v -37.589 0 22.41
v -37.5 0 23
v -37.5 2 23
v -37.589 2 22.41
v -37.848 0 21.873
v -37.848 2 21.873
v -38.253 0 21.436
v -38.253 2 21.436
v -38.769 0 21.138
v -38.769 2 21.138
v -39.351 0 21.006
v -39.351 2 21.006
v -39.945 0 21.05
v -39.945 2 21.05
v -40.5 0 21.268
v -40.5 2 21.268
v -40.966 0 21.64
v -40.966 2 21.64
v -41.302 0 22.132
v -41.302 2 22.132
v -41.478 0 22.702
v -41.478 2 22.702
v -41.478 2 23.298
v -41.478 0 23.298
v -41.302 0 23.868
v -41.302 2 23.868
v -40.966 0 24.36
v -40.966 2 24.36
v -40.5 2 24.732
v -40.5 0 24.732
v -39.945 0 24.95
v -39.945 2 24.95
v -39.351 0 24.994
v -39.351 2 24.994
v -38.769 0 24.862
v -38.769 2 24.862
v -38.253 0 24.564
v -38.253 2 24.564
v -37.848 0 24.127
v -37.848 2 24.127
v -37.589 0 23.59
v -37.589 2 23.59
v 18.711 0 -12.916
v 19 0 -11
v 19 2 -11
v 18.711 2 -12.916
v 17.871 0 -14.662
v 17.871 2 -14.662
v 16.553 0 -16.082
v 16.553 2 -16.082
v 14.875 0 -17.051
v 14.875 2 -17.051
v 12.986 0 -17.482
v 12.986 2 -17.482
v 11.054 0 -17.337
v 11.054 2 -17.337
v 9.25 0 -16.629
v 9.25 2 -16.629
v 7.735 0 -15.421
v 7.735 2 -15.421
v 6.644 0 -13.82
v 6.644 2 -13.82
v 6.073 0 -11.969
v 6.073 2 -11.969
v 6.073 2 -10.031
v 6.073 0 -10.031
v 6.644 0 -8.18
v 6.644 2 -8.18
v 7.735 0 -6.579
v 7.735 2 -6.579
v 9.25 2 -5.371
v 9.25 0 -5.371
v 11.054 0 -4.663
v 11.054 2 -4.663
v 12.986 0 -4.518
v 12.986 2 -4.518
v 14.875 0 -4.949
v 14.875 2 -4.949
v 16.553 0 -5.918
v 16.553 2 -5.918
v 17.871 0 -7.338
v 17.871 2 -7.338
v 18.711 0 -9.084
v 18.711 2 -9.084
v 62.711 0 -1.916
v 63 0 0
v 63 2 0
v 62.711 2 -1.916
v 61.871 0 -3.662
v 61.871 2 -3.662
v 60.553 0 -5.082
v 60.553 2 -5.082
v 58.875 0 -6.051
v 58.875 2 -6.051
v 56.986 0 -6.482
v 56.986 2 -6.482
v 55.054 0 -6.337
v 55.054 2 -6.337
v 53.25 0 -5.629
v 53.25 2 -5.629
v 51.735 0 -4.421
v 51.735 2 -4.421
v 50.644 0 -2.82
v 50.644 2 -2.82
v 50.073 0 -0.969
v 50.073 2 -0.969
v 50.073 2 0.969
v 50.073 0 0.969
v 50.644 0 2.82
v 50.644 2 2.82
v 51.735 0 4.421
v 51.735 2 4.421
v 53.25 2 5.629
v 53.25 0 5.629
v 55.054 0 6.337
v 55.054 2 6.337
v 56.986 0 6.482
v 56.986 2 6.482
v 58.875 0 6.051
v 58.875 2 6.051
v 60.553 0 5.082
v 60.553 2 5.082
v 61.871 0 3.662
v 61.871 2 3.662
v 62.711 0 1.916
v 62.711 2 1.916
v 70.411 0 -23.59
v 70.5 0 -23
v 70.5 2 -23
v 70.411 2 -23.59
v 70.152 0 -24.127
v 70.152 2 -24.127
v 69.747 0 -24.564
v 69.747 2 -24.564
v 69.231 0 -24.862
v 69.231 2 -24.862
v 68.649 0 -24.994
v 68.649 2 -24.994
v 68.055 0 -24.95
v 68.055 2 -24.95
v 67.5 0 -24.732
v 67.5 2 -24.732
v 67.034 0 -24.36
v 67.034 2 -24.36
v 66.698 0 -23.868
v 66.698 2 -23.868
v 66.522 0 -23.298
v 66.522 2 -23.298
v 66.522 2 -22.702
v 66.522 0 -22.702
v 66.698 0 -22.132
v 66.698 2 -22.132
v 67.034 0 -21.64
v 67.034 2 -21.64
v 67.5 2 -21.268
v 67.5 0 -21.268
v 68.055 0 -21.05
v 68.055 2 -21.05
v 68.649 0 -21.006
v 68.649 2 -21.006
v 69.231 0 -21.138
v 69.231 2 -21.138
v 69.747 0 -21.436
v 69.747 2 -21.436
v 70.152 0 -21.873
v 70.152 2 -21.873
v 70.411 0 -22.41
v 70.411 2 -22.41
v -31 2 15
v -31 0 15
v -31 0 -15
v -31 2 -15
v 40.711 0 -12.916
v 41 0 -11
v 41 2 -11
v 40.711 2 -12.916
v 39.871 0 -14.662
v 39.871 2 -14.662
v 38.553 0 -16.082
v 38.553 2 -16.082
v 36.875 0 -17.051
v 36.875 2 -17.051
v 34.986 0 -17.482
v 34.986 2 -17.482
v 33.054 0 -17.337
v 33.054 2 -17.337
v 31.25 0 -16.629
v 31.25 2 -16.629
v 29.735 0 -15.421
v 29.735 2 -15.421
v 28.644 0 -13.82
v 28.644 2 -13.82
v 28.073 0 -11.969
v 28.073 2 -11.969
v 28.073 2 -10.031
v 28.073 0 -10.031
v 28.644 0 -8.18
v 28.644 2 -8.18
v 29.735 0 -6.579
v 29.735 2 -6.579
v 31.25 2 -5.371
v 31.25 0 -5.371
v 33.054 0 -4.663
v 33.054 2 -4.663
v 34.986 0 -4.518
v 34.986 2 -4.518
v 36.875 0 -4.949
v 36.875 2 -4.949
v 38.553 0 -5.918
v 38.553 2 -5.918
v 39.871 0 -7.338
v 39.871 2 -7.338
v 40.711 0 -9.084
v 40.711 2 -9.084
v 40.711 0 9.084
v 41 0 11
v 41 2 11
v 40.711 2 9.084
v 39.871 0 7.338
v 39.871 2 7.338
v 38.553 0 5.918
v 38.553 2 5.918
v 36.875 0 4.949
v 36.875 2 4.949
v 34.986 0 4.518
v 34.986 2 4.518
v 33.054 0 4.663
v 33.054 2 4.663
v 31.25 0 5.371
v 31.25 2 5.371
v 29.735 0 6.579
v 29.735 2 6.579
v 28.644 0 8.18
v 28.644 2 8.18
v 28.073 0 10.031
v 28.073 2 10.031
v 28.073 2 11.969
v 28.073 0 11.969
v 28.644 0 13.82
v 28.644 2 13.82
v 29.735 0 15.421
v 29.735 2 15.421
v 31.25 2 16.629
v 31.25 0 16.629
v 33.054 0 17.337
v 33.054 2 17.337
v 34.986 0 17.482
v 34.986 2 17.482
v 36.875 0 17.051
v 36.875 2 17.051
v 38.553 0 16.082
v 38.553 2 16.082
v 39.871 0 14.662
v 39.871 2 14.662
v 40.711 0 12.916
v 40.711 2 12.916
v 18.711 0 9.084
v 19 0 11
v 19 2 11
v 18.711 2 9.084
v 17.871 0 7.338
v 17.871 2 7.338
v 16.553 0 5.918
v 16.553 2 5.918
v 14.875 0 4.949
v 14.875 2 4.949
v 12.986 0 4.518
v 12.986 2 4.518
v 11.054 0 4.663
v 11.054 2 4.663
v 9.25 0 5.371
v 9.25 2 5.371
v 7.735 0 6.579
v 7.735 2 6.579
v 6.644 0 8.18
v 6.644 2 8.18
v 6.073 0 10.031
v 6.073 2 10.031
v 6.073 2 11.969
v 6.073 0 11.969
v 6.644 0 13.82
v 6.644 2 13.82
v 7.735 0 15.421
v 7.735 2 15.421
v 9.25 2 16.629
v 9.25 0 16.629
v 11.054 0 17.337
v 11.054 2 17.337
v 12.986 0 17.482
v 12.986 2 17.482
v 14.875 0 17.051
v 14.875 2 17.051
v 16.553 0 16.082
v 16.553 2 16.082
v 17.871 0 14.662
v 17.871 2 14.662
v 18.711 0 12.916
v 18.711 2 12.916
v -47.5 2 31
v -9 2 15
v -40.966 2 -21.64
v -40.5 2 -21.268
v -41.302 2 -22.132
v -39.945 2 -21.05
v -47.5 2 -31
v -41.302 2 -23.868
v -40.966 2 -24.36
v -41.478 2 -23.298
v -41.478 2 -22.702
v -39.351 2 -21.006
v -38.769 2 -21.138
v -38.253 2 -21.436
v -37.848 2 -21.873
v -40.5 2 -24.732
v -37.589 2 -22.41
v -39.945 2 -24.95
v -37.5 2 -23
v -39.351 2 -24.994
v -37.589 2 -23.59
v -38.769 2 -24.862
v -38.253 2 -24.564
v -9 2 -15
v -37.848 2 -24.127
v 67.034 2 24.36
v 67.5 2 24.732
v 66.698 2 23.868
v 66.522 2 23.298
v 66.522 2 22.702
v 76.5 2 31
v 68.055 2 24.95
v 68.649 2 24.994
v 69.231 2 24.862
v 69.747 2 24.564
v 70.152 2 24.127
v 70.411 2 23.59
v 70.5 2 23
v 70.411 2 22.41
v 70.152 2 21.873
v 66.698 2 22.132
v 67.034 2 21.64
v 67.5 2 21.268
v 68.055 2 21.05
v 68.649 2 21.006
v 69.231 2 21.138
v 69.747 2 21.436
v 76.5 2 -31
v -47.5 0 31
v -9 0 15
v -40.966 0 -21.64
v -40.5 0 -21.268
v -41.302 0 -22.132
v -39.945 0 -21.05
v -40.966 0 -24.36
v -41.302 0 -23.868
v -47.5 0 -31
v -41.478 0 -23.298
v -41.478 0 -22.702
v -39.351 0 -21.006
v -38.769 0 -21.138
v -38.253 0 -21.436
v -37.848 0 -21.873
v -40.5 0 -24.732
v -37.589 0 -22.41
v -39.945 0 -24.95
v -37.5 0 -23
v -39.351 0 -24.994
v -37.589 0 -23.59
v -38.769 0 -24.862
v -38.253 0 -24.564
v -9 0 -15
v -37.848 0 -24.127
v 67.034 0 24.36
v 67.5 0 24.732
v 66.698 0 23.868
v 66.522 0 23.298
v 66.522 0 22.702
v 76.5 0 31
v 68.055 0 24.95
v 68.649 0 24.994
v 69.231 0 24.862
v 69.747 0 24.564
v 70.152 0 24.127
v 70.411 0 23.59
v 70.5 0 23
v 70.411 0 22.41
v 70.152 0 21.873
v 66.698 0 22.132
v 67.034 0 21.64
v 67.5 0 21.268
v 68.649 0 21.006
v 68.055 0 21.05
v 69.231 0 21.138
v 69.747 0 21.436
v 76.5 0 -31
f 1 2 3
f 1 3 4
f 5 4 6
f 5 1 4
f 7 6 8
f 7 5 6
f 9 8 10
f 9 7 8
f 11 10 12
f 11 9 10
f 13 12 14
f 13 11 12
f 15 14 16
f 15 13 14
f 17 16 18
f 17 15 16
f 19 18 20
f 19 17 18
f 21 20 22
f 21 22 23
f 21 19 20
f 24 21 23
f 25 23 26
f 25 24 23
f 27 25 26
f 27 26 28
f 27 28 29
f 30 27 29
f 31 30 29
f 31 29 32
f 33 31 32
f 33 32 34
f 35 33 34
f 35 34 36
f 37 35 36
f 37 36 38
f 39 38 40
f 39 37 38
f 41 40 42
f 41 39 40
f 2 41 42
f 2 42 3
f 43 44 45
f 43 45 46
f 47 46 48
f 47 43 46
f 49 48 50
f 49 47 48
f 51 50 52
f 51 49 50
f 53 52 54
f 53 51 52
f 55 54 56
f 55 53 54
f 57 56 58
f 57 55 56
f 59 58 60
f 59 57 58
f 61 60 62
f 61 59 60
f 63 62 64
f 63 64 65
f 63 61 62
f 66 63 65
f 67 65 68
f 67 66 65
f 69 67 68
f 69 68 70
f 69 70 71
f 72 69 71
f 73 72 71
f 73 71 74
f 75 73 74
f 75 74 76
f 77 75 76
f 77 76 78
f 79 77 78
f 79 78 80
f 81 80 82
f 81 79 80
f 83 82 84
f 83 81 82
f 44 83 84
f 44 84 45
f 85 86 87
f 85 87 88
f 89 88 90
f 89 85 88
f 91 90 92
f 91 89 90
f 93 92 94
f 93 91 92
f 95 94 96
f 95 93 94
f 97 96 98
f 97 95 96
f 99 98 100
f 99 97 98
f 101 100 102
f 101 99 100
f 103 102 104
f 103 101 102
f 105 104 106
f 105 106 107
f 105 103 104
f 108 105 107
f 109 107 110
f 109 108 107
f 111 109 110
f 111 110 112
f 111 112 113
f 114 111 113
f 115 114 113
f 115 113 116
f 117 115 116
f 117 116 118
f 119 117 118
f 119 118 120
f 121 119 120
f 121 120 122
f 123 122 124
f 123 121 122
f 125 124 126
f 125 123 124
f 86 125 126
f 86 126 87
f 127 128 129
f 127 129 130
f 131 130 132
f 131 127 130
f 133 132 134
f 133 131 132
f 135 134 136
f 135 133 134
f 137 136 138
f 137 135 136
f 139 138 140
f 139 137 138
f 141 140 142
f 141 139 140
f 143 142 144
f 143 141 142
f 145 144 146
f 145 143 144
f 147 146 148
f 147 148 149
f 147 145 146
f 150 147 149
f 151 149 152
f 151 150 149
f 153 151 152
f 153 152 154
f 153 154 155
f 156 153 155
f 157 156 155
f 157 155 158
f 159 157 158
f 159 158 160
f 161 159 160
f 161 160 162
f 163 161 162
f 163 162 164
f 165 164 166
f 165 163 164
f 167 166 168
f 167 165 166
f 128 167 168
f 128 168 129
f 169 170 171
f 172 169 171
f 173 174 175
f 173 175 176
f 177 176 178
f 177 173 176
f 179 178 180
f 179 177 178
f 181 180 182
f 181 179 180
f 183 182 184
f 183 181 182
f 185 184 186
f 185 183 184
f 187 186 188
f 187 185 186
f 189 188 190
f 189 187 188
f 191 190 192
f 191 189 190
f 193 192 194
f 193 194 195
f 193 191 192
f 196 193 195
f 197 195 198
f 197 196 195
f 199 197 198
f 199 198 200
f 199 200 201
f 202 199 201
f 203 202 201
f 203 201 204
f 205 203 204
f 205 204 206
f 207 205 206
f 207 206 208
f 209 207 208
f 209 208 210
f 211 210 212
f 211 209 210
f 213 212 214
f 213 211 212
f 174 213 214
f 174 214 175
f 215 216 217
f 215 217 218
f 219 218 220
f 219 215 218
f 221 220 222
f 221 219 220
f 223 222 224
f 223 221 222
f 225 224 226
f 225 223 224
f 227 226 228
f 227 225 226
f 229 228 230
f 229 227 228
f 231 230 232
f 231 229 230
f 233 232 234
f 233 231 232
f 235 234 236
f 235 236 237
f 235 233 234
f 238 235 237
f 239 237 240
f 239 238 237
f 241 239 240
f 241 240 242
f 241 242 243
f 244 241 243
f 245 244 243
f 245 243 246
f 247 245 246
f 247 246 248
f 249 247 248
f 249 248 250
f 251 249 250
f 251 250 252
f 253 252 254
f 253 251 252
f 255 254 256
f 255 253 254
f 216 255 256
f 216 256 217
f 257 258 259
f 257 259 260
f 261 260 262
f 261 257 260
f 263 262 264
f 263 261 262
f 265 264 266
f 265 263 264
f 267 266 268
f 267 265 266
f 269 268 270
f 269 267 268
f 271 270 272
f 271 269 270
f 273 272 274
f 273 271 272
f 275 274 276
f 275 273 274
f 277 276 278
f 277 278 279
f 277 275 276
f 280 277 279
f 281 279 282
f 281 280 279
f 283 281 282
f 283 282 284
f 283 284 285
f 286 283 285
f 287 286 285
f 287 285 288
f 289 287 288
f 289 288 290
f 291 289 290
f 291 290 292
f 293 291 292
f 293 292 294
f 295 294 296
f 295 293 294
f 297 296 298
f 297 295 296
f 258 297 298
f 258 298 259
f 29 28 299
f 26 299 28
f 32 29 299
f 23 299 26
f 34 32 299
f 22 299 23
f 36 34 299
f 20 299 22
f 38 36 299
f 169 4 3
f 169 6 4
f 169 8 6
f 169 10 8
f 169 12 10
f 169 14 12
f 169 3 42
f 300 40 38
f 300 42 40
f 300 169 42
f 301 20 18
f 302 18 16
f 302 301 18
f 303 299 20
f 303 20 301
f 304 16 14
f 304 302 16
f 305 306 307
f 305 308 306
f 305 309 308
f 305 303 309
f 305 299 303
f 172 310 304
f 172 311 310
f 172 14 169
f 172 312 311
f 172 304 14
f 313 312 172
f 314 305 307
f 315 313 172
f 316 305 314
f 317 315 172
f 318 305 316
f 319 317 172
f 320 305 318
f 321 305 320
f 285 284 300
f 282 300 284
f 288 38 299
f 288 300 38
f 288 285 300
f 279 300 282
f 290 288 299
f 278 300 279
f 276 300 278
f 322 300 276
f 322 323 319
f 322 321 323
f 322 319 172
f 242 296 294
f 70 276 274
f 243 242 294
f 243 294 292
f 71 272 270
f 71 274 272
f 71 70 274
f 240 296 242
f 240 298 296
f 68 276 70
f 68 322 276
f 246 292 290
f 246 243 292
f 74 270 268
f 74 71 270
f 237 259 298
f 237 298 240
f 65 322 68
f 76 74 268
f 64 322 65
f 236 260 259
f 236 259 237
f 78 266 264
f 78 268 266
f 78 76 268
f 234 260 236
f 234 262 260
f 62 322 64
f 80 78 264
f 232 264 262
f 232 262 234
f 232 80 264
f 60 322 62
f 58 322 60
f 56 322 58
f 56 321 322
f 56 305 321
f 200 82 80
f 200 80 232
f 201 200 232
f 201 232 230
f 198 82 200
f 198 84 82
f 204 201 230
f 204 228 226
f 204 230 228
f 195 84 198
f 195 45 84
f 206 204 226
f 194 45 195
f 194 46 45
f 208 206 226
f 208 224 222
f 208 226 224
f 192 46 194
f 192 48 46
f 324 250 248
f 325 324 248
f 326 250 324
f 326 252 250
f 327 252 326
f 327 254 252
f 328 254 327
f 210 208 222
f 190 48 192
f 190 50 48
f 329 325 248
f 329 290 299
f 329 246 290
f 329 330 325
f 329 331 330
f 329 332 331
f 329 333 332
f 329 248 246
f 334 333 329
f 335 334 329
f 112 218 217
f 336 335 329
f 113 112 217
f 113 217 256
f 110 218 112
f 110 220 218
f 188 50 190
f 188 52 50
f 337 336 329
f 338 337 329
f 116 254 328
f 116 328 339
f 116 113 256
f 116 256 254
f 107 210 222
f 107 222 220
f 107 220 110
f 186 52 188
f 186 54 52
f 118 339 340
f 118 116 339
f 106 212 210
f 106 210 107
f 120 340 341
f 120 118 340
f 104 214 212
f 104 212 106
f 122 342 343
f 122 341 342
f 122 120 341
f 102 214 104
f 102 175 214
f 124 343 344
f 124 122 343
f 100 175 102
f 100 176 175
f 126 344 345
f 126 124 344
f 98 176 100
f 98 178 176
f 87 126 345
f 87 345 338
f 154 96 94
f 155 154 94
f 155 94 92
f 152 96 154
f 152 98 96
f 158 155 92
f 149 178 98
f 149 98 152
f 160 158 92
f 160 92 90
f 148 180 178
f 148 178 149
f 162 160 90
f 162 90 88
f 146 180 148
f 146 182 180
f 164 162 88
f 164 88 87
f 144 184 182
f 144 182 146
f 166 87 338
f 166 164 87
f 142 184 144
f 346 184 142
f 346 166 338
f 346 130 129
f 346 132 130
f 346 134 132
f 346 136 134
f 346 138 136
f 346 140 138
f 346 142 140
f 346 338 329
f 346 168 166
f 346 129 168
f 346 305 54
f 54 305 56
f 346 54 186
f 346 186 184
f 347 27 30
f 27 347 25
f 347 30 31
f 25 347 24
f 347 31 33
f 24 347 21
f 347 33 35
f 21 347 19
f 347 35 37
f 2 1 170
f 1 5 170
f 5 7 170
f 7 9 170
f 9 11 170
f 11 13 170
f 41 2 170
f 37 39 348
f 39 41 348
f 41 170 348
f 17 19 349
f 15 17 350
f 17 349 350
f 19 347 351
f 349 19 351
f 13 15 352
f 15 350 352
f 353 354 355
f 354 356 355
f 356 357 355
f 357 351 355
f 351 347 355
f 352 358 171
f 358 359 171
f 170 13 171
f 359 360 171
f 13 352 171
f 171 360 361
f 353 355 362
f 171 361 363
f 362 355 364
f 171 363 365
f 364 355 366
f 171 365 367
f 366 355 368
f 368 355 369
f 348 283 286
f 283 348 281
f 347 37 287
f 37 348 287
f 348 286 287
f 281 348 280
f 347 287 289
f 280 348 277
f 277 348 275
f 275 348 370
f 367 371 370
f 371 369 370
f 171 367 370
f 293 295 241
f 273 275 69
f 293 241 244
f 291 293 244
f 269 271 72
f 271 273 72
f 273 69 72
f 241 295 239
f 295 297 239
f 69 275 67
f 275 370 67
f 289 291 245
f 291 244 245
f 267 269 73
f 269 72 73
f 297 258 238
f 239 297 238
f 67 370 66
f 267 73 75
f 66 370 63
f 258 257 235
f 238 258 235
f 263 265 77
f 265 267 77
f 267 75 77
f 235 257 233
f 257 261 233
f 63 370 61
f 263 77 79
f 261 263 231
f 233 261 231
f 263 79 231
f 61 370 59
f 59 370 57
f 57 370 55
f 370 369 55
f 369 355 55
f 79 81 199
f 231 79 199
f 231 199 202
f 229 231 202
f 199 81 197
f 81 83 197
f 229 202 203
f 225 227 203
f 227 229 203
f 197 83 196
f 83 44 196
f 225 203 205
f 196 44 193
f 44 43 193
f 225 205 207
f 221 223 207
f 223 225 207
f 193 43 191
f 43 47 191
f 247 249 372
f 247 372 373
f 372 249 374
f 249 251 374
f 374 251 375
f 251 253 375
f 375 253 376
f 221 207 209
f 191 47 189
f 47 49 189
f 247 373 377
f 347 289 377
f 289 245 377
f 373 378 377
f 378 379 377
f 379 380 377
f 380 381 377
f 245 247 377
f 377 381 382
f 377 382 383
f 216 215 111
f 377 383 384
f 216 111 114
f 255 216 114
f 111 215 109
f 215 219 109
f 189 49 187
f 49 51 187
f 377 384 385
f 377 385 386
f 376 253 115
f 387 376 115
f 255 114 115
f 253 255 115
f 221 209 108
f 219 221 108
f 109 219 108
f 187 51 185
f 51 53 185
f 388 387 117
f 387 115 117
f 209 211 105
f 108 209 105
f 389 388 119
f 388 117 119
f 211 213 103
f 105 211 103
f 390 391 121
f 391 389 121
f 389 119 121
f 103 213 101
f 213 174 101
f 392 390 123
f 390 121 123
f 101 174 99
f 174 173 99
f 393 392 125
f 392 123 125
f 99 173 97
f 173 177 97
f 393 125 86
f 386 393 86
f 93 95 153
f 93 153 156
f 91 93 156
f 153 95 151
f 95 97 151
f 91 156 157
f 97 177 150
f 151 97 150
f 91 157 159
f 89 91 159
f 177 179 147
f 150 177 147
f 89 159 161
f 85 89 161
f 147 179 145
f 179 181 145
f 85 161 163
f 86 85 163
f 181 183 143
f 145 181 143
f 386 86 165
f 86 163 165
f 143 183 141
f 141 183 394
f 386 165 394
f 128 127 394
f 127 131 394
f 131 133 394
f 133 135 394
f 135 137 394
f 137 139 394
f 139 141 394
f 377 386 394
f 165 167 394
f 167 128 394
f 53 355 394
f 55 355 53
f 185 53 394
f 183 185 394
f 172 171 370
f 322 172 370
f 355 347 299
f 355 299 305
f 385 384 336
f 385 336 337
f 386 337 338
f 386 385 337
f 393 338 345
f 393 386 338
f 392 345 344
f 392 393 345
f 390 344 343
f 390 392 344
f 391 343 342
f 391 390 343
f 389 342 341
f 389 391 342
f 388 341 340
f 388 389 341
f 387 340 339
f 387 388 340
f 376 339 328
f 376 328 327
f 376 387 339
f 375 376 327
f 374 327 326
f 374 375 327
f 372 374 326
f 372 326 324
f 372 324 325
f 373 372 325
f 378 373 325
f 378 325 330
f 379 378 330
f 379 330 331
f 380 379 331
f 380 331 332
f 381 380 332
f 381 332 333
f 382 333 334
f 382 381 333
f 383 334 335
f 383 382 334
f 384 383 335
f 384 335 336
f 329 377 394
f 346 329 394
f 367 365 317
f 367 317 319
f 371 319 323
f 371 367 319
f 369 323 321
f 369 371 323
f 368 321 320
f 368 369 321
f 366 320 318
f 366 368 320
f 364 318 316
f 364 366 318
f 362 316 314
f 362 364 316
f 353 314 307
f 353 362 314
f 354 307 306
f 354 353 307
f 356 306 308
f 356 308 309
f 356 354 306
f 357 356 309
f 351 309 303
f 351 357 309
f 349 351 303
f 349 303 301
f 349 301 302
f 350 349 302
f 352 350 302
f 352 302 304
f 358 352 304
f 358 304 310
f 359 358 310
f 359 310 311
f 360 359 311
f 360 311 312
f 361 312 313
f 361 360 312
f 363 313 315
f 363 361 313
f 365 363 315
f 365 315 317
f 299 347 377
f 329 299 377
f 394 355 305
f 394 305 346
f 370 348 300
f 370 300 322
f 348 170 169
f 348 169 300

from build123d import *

# Parameters (mm, degrees)
SKETCH1_W           = 124
SKETCH1_H           = 62
SKETCH1_R           = 6.5
SKETCH1_R_2         = 2
SKETCH1_W_2         = 22
SKETCH1_H_2         = 30
BOSS_EXTRUDE1_DEPTH = 2


with BuildPart() as part:
    # Sketch1 → Boss-Extrude1 (new body)
    with BuildSketch(Plane(origin=(0, 0, 0), x_dir=(1, 0, 0), z_dir=(0, 1, 0))):
        with Locations((14.5, 0)):
            Rectangle(SKETCH1_W, SKETCH1_H)
        with Locations((12.5, 11)):
            Circle(SKETCH1_R, mode=Mode.SUBTRACT)
        with Locations((12.5, -11)):
            Circle(SKETCH1_R, mode=Mode.SUBTRACT)
        with Locations((34.5, 11)):
            Circle(SKETCH1_R, mode=Mode.SUBTRACT)
        with Locations((34.5, -11)):
            Circle(SKETCH1_R, mode=Mode.SUBTRACT)
        with Locations((56.5, 0)):
            Circle(SKETCH1_R, mode=Mode.SUBTRACT)
        with Locations((-39.5, 23)):
            Circle(SKETCH1_R_2, mode=Mode.SUBTRACT)
        with Locations((68.5, 23)):
            Circle(SKETCH1_R_2, mode=Mode.SUBTRACT)
        with Locations((68.5, -23)):
            Circle(SKETCH1_R_2, mode=Mode.SUBTRACT)
        with Locations((-39.5, -23)):
            Circle(SKETCH1_R_2, mode=Mode.SUBTRACT)
        with Locations((-20, 0)):
            Rectangle(SKETCH1_W_2, SKETCH1_H_2, mode=Mode.SUBTRACT)
    extrude(amount=BOSS_EXTRUDE1_DEPTH)


solid = part.part
